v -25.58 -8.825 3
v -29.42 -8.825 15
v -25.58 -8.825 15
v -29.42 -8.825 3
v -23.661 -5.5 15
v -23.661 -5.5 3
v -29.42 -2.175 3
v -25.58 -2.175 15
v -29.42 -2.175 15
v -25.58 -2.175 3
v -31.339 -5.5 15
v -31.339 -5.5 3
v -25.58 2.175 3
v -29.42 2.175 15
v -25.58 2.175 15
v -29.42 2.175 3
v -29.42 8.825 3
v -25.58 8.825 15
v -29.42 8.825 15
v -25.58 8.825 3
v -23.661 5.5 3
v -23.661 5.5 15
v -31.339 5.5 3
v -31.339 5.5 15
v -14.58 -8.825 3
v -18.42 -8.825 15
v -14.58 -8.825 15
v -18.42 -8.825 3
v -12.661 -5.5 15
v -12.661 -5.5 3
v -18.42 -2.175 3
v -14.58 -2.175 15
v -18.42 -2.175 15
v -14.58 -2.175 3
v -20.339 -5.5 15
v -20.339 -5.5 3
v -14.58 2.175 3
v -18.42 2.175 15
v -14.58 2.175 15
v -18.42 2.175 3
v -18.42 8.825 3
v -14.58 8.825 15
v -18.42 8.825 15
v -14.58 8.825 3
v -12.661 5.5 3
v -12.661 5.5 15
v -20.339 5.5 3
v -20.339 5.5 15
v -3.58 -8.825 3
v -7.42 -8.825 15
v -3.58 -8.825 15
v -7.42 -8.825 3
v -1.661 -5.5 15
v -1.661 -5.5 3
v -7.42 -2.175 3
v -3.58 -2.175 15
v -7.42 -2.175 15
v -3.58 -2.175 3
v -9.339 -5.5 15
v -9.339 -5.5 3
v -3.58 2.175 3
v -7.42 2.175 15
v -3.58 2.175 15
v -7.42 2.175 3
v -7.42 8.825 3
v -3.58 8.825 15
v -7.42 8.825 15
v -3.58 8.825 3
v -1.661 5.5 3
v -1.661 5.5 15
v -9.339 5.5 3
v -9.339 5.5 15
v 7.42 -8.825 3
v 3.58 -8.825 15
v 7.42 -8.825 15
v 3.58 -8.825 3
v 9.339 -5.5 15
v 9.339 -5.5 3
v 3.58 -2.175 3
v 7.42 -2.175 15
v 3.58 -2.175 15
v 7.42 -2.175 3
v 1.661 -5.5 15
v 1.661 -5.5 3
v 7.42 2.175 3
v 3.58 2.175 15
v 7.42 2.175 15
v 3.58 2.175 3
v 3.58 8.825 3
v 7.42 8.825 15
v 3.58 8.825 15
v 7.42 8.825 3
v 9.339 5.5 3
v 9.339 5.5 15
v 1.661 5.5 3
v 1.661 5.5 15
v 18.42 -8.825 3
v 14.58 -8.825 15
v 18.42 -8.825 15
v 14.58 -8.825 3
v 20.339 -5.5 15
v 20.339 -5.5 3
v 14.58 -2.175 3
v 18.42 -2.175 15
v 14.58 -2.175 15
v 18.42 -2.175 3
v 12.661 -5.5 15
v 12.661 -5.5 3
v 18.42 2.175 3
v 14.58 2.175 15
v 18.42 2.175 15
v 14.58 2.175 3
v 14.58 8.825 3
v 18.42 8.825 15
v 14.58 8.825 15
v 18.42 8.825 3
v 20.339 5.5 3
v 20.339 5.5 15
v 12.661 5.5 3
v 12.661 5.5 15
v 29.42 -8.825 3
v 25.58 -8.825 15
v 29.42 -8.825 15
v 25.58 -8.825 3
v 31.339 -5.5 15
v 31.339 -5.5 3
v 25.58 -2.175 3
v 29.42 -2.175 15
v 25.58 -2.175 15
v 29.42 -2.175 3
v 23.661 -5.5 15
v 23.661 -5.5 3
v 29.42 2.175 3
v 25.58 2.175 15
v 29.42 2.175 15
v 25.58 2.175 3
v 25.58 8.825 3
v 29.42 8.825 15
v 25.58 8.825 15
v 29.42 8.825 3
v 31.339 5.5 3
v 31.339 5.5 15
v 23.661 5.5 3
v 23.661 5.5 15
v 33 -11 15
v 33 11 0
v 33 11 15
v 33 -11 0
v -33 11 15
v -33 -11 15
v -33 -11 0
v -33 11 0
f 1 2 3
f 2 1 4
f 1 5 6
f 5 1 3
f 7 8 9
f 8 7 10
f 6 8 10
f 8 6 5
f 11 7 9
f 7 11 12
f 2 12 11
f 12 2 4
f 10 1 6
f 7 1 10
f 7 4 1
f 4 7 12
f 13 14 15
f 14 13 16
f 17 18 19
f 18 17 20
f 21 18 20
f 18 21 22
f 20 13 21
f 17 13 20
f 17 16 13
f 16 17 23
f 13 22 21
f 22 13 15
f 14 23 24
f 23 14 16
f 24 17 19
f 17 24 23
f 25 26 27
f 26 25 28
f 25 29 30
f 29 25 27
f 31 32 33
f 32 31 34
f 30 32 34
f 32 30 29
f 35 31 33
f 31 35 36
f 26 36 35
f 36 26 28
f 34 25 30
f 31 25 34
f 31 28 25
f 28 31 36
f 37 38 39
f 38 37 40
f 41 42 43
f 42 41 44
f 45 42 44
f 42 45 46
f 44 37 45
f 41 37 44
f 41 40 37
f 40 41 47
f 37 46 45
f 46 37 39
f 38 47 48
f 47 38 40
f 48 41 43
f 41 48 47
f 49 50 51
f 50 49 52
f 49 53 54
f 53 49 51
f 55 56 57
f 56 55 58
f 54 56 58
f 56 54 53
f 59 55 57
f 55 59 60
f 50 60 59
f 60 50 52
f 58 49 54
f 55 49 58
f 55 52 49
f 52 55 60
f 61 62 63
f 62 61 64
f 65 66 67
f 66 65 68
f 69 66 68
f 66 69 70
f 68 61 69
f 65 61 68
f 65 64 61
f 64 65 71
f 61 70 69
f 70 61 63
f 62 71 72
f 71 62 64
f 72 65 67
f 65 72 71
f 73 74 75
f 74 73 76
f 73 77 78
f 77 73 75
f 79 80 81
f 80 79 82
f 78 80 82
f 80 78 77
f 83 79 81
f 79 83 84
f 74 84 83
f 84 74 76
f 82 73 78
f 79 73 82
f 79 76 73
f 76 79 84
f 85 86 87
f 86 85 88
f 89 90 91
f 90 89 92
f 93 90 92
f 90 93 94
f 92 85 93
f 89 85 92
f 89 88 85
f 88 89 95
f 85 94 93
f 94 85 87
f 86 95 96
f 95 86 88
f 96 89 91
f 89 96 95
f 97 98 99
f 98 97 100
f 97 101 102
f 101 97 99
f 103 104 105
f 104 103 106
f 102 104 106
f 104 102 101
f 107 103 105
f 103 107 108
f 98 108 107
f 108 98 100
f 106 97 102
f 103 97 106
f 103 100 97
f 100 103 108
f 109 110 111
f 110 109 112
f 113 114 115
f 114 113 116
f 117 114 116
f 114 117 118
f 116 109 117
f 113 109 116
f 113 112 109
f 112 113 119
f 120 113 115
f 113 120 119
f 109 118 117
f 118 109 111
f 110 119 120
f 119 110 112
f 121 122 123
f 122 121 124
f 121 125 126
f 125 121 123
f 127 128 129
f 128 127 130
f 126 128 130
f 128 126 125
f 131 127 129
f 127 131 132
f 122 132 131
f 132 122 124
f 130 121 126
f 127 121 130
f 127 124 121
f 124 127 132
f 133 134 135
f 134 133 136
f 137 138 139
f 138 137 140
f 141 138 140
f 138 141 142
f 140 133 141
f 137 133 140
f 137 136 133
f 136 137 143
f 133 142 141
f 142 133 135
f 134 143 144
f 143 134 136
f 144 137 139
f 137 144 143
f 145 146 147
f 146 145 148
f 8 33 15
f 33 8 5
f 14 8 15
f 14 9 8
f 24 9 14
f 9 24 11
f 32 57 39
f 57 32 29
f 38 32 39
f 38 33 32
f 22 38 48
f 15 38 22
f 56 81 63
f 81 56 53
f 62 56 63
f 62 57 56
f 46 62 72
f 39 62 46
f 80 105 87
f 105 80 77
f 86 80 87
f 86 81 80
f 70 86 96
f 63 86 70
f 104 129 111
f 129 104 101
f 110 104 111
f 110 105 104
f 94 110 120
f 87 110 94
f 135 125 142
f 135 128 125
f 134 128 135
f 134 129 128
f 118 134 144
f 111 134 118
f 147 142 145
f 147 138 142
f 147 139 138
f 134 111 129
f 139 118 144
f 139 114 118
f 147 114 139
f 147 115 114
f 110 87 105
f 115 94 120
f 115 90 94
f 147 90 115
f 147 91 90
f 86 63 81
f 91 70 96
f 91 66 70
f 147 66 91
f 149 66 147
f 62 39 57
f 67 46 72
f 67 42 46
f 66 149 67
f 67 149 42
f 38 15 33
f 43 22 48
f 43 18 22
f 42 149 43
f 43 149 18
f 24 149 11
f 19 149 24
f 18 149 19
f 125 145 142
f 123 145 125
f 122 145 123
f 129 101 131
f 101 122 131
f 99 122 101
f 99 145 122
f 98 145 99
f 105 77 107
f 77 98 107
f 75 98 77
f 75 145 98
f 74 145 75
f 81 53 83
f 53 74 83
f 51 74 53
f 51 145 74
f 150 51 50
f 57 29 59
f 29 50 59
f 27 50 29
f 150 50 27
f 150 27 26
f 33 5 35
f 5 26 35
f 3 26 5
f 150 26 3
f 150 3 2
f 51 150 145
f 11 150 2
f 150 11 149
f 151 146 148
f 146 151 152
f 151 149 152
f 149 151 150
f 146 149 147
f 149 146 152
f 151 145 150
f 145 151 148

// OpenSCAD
// Hex bit holder: a block with a grid of hexagonal sockets for 1/4" driver bits.
/* [Holder] */
// Bits per row
columns = 6; // [2:1:12]
// Rows
rows = 2; // [1:1:4]
// Socket depth
depth = 12; // [6:1:20]
// Clearance on the hex
clearance = 0.3; // [0:0.05:0.6]

bit = 6.35; // 1/4" across flats
pitch = 11;
base = 3;

module socket() {
  // a hexagonal socket: across flats `bit + clearance`
  cylinder(r = (bit + clearance) / sqrt(3), h = depth + 1, $fn = 6);
}

difference() {
  translate([-columns * pitch / 2, -rows * pitch / 2, 0])
    cube([columns * pitch, rows * pitch, depth + base]);
  for (i = [0 : columns - 1], j = [0 : rows - 1])
    translate([(i - (columns - 1) / 2) * pitch, (j - (rows - 1) / 2) * pitch, base])
      socket();
}
